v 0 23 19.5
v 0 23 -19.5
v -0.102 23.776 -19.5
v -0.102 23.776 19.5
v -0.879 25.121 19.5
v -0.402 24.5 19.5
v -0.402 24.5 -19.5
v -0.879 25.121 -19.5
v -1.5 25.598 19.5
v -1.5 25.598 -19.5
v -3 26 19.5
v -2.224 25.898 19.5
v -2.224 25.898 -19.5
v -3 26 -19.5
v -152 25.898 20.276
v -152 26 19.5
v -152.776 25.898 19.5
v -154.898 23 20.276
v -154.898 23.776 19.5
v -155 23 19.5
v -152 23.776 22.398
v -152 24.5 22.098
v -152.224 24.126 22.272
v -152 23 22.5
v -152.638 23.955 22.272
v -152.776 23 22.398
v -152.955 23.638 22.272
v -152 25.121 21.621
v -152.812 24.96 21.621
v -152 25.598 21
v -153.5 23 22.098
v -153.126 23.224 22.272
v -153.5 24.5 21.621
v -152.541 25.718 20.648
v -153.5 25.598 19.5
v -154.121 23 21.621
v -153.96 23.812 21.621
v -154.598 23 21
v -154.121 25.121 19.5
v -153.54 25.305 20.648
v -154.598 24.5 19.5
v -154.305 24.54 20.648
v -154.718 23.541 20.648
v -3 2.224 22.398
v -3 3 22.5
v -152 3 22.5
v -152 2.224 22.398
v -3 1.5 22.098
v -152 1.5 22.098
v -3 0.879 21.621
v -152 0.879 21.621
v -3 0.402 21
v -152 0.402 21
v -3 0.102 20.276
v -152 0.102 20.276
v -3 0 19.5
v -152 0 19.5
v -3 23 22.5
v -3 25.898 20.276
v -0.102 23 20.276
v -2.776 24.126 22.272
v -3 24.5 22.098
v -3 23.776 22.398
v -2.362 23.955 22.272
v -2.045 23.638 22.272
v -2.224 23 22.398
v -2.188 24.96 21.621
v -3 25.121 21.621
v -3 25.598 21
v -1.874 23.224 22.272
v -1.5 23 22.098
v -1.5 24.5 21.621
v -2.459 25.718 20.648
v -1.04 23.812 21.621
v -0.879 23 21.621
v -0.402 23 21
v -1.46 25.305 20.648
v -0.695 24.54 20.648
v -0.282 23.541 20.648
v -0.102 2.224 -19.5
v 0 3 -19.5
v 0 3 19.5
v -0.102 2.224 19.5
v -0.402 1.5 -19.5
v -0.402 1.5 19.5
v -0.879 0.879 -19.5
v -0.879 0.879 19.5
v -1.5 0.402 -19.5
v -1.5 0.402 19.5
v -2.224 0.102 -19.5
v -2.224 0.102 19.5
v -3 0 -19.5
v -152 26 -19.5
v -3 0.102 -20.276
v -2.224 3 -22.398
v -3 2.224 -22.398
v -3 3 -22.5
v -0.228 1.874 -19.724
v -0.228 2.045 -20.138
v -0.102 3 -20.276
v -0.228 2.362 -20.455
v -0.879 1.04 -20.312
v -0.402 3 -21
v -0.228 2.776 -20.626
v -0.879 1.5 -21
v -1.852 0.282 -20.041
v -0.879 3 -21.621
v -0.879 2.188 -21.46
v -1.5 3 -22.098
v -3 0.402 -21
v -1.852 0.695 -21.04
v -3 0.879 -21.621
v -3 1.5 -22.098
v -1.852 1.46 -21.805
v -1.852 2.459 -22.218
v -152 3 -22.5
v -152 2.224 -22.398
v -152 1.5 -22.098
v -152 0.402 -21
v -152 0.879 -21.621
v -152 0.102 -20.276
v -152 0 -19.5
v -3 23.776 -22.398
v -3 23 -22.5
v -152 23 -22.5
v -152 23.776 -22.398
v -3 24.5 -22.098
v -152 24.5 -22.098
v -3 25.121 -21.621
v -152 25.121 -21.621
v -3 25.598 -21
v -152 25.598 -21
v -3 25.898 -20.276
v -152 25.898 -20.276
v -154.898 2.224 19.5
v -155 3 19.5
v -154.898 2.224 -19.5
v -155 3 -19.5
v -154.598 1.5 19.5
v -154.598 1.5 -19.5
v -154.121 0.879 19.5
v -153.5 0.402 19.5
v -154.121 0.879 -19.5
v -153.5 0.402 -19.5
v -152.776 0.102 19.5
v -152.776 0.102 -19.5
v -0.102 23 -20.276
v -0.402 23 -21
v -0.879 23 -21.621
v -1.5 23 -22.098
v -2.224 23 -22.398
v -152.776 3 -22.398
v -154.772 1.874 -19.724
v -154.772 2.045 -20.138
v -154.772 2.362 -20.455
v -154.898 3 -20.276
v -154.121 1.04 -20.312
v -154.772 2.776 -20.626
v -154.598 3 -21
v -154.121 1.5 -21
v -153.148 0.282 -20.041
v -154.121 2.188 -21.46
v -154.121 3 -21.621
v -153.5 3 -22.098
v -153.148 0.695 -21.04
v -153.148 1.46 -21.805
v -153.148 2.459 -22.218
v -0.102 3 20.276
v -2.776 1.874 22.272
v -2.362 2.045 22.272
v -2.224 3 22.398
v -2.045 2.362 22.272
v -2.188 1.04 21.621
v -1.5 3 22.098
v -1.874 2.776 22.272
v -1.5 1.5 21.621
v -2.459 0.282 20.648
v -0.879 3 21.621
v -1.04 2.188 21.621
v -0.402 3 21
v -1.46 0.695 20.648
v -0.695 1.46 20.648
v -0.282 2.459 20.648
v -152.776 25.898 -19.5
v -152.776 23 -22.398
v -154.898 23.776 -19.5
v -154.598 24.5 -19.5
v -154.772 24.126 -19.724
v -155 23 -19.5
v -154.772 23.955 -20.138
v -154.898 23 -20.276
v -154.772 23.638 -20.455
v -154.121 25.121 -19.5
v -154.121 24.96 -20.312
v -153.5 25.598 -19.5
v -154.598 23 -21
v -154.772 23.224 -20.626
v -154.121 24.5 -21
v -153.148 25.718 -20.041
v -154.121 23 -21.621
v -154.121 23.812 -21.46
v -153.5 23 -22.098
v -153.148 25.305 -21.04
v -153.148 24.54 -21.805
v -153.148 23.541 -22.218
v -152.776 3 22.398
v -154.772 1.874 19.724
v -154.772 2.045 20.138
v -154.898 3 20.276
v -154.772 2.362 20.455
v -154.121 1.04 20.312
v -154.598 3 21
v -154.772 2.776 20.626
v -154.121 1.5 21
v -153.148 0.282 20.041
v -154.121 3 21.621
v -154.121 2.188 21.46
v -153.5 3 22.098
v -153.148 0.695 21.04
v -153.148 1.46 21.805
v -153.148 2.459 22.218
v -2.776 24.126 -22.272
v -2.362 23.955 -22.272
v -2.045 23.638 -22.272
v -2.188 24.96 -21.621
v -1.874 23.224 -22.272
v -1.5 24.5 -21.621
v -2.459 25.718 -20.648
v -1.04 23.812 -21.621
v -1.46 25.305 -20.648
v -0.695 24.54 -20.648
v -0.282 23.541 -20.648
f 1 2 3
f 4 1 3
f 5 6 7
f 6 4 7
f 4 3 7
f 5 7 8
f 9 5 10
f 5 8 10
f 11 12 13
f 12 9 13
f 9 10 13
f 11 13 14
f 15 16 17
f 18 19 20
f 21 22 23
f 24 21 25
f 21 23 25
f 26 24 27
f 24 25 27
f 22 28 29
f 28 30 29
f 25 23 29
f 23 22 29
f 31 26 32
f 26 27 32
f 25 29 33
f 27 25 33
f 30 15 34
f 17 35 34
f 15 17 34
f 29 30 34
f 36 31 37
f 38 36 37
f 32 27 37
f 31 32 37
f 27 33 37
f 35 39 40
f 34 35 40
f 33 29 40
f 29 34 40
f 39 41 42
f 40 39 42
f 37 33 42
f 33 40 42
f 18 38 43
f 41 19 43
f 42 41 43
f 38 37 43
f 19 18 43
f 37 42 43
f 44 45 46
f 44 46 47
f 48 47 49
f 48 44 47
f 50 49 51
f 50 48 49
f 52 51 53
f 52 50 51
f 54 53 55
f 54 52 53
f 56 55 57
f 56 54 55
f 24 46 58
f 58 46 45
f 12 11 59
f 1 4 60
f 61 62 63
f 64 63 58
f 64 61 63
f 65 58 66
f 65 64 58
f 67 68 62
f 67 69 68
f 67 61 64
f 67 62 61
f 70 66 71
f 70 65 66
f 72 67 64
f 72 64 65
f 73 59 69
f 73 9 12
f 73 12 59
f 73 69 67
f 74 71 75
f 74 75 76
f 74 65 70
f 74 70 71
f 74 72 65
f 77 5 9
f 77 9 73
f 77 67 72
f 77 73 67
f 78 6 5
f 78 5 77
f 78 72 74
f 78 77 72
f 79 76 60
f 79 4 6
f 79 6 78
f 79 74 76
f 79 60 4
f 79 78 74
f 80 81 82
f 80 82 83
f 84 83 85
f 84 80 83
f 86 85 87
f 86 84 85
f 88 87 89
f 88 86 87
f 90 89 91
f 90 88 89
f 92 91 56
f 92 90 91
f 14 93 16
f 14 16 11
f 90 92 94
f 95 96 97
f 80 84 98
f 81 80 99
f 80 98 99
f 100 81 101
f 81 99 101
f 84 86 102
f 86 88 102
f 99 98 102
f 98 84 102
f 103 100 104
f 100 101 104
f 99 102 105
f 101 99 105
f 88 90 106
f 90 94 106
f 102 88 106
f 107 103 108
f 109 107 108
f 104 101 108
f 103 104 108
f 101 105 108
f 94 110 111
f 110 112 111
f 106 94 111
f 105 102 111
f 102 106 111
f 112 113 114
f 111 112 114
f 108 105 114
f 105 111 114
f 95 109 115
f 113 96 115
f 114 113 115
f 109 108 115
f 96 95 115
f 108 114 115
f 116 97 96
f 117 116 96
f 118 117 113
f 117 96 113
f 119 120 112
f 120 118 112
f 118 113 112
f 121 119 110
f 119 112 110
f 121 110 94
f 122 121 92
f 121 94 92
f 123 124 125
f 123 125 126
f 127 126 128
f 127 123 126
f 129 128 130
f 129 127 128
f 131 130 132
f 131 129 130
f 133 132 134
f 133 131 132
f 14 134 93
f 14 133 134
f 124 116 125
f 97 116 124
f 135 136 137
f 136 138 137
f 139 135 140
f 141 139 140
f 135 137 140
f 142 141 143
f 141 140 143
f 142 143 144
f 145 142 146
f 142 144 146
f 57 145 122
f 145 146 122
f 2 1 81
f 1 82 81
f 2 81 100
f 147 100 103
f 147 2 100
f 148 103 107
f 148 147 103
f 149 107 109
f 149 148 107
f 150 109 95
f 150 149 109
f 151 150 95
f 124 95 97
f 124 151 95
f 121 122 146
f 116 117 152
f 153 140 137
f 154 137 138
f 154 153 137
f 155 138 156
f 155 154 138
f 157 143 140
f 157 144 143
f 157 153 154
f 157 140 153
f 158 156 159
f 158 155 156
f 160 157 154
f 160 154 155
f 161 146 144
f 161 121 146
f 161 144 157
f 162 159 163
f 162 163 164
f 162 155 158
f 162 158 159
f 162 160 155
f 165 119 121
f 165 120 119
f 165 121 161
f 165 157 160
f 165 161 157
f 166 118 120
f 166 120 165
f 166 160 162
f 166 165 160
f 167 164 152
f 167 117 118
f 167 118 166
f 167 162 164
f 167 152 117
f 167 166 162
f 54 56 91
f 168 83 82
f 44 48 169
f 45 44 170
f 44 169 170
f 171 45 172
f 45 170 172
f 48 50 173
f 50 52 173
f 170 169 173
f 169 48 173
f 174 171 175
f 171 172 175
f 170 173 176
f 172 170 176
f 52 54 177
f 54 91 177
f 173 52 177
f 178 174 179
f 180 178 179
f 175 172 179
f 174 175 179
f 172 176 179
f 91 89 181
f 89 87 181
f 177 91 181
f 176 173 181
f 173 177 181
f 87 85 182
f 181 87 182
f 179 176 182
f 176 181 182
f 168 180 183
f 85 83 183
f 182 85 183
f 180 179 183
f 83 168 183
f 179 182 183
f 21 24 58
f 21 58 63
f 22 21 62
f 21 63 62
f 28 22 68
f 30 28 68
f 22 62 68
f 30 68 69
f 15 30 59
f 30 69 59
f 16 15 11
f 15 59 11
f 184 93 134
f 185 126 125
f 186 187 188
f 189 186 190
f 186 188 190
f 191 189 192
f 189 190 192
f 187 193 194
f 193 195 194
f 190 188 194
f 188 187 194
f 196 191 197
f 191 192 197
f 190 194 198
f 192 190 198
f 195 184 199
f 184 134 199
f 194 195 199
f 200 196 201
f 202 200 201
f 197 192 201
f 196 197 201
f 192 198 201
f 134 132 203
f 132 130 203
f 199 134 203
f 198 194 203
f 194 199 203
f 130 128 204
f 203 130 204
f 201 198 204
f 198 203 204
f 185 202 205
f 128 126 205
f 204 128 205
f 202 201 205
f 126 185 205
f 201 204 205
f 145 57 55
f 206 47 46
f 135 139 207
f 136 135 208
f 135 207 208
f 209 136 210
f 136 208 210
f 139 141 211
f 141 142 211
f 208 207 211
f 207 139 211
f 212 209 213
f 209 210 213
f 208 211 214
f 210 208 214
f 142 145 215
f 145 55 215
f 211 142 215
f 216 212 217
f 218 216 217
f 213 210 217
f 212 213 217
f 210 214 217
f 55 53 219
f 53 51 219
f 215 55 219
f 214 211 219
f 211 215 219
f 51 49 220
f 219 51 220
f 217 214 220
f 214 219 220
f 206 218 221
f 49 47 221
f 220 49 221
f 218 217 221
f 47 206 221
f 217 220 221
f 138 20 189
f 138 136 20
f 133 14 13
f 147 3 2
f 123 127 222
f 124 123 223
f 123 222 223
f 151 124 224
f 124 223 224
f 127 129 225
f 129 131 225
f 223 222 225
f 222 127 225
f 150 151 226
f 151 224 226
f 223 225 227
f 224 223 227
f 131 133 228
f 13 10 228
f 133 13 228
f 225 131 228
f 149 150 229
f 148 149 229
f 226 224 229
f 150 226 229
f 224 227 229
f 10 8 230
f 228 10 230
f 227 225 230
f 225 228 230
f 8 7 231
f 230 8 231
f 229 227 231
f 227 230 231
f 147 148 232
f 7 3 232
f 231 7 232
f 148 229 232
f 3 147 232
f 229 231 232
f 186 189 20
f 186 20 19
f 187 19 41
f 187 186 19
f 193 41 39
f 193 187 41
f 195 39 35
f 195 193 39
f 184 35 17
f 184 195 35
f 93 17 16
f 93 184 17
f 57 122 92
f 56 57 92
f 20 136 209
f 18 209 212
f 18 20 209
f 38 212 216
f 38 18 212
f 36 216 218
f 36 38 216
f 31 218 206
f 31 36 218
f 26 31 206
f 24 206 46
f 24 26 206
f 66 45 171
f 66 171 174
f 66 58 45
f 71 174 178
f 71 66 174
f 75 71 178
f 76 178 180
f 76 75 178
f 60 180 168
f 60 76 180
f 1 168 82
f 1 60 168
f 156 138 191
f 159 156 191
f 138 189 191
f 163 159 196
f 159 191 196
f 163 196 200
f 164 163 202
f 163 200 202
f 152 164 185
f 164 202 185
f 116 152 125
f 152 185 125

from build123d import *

# Parameters (mm, degrees)
ESQUISSE1_W        = 155
ESQUISSE1_H        = 45
BOSS_EXTRU_1_DEPTH = 26
CONG_1_R           = 3


with BuildPart() as part:
    # Esquisse1 → Boss.-Extru.1 (new body)
    with BuildSketch(Plane(origin=(0, 0, 0), x_dir=(1, 0, 0), z_dir=(0, 1, 0))):
        with Locations((-77.5, 0)):
            Rectangle(ESQUISSE1_W, ESQUISSE1_H)
    extrude(amount=BOSS_EXTRU_1_DEPTH)

    # Congé1
    cong_1_edges = [part.edges().sort_by_distance(p)[0] for p in [
        (0, 26, 0),
        (-77.5, 26, -22.5),
        (-155, 26, 0),
        (-77.5, 0, -22.5),
        (0, 0, 0),
        (-77.5, 0, 22.5),
        (-155, 0, 0),
        (-77.5, 26, 22.5),
        (-155, 13, -22.5),
        (0, 13, -22.5),
        (0, 13, 22.5),
        (-155, 13, 22.5),
    ]]
    fillet(cong_1_edges, radius=CONG_1_R)


solid = part.part
